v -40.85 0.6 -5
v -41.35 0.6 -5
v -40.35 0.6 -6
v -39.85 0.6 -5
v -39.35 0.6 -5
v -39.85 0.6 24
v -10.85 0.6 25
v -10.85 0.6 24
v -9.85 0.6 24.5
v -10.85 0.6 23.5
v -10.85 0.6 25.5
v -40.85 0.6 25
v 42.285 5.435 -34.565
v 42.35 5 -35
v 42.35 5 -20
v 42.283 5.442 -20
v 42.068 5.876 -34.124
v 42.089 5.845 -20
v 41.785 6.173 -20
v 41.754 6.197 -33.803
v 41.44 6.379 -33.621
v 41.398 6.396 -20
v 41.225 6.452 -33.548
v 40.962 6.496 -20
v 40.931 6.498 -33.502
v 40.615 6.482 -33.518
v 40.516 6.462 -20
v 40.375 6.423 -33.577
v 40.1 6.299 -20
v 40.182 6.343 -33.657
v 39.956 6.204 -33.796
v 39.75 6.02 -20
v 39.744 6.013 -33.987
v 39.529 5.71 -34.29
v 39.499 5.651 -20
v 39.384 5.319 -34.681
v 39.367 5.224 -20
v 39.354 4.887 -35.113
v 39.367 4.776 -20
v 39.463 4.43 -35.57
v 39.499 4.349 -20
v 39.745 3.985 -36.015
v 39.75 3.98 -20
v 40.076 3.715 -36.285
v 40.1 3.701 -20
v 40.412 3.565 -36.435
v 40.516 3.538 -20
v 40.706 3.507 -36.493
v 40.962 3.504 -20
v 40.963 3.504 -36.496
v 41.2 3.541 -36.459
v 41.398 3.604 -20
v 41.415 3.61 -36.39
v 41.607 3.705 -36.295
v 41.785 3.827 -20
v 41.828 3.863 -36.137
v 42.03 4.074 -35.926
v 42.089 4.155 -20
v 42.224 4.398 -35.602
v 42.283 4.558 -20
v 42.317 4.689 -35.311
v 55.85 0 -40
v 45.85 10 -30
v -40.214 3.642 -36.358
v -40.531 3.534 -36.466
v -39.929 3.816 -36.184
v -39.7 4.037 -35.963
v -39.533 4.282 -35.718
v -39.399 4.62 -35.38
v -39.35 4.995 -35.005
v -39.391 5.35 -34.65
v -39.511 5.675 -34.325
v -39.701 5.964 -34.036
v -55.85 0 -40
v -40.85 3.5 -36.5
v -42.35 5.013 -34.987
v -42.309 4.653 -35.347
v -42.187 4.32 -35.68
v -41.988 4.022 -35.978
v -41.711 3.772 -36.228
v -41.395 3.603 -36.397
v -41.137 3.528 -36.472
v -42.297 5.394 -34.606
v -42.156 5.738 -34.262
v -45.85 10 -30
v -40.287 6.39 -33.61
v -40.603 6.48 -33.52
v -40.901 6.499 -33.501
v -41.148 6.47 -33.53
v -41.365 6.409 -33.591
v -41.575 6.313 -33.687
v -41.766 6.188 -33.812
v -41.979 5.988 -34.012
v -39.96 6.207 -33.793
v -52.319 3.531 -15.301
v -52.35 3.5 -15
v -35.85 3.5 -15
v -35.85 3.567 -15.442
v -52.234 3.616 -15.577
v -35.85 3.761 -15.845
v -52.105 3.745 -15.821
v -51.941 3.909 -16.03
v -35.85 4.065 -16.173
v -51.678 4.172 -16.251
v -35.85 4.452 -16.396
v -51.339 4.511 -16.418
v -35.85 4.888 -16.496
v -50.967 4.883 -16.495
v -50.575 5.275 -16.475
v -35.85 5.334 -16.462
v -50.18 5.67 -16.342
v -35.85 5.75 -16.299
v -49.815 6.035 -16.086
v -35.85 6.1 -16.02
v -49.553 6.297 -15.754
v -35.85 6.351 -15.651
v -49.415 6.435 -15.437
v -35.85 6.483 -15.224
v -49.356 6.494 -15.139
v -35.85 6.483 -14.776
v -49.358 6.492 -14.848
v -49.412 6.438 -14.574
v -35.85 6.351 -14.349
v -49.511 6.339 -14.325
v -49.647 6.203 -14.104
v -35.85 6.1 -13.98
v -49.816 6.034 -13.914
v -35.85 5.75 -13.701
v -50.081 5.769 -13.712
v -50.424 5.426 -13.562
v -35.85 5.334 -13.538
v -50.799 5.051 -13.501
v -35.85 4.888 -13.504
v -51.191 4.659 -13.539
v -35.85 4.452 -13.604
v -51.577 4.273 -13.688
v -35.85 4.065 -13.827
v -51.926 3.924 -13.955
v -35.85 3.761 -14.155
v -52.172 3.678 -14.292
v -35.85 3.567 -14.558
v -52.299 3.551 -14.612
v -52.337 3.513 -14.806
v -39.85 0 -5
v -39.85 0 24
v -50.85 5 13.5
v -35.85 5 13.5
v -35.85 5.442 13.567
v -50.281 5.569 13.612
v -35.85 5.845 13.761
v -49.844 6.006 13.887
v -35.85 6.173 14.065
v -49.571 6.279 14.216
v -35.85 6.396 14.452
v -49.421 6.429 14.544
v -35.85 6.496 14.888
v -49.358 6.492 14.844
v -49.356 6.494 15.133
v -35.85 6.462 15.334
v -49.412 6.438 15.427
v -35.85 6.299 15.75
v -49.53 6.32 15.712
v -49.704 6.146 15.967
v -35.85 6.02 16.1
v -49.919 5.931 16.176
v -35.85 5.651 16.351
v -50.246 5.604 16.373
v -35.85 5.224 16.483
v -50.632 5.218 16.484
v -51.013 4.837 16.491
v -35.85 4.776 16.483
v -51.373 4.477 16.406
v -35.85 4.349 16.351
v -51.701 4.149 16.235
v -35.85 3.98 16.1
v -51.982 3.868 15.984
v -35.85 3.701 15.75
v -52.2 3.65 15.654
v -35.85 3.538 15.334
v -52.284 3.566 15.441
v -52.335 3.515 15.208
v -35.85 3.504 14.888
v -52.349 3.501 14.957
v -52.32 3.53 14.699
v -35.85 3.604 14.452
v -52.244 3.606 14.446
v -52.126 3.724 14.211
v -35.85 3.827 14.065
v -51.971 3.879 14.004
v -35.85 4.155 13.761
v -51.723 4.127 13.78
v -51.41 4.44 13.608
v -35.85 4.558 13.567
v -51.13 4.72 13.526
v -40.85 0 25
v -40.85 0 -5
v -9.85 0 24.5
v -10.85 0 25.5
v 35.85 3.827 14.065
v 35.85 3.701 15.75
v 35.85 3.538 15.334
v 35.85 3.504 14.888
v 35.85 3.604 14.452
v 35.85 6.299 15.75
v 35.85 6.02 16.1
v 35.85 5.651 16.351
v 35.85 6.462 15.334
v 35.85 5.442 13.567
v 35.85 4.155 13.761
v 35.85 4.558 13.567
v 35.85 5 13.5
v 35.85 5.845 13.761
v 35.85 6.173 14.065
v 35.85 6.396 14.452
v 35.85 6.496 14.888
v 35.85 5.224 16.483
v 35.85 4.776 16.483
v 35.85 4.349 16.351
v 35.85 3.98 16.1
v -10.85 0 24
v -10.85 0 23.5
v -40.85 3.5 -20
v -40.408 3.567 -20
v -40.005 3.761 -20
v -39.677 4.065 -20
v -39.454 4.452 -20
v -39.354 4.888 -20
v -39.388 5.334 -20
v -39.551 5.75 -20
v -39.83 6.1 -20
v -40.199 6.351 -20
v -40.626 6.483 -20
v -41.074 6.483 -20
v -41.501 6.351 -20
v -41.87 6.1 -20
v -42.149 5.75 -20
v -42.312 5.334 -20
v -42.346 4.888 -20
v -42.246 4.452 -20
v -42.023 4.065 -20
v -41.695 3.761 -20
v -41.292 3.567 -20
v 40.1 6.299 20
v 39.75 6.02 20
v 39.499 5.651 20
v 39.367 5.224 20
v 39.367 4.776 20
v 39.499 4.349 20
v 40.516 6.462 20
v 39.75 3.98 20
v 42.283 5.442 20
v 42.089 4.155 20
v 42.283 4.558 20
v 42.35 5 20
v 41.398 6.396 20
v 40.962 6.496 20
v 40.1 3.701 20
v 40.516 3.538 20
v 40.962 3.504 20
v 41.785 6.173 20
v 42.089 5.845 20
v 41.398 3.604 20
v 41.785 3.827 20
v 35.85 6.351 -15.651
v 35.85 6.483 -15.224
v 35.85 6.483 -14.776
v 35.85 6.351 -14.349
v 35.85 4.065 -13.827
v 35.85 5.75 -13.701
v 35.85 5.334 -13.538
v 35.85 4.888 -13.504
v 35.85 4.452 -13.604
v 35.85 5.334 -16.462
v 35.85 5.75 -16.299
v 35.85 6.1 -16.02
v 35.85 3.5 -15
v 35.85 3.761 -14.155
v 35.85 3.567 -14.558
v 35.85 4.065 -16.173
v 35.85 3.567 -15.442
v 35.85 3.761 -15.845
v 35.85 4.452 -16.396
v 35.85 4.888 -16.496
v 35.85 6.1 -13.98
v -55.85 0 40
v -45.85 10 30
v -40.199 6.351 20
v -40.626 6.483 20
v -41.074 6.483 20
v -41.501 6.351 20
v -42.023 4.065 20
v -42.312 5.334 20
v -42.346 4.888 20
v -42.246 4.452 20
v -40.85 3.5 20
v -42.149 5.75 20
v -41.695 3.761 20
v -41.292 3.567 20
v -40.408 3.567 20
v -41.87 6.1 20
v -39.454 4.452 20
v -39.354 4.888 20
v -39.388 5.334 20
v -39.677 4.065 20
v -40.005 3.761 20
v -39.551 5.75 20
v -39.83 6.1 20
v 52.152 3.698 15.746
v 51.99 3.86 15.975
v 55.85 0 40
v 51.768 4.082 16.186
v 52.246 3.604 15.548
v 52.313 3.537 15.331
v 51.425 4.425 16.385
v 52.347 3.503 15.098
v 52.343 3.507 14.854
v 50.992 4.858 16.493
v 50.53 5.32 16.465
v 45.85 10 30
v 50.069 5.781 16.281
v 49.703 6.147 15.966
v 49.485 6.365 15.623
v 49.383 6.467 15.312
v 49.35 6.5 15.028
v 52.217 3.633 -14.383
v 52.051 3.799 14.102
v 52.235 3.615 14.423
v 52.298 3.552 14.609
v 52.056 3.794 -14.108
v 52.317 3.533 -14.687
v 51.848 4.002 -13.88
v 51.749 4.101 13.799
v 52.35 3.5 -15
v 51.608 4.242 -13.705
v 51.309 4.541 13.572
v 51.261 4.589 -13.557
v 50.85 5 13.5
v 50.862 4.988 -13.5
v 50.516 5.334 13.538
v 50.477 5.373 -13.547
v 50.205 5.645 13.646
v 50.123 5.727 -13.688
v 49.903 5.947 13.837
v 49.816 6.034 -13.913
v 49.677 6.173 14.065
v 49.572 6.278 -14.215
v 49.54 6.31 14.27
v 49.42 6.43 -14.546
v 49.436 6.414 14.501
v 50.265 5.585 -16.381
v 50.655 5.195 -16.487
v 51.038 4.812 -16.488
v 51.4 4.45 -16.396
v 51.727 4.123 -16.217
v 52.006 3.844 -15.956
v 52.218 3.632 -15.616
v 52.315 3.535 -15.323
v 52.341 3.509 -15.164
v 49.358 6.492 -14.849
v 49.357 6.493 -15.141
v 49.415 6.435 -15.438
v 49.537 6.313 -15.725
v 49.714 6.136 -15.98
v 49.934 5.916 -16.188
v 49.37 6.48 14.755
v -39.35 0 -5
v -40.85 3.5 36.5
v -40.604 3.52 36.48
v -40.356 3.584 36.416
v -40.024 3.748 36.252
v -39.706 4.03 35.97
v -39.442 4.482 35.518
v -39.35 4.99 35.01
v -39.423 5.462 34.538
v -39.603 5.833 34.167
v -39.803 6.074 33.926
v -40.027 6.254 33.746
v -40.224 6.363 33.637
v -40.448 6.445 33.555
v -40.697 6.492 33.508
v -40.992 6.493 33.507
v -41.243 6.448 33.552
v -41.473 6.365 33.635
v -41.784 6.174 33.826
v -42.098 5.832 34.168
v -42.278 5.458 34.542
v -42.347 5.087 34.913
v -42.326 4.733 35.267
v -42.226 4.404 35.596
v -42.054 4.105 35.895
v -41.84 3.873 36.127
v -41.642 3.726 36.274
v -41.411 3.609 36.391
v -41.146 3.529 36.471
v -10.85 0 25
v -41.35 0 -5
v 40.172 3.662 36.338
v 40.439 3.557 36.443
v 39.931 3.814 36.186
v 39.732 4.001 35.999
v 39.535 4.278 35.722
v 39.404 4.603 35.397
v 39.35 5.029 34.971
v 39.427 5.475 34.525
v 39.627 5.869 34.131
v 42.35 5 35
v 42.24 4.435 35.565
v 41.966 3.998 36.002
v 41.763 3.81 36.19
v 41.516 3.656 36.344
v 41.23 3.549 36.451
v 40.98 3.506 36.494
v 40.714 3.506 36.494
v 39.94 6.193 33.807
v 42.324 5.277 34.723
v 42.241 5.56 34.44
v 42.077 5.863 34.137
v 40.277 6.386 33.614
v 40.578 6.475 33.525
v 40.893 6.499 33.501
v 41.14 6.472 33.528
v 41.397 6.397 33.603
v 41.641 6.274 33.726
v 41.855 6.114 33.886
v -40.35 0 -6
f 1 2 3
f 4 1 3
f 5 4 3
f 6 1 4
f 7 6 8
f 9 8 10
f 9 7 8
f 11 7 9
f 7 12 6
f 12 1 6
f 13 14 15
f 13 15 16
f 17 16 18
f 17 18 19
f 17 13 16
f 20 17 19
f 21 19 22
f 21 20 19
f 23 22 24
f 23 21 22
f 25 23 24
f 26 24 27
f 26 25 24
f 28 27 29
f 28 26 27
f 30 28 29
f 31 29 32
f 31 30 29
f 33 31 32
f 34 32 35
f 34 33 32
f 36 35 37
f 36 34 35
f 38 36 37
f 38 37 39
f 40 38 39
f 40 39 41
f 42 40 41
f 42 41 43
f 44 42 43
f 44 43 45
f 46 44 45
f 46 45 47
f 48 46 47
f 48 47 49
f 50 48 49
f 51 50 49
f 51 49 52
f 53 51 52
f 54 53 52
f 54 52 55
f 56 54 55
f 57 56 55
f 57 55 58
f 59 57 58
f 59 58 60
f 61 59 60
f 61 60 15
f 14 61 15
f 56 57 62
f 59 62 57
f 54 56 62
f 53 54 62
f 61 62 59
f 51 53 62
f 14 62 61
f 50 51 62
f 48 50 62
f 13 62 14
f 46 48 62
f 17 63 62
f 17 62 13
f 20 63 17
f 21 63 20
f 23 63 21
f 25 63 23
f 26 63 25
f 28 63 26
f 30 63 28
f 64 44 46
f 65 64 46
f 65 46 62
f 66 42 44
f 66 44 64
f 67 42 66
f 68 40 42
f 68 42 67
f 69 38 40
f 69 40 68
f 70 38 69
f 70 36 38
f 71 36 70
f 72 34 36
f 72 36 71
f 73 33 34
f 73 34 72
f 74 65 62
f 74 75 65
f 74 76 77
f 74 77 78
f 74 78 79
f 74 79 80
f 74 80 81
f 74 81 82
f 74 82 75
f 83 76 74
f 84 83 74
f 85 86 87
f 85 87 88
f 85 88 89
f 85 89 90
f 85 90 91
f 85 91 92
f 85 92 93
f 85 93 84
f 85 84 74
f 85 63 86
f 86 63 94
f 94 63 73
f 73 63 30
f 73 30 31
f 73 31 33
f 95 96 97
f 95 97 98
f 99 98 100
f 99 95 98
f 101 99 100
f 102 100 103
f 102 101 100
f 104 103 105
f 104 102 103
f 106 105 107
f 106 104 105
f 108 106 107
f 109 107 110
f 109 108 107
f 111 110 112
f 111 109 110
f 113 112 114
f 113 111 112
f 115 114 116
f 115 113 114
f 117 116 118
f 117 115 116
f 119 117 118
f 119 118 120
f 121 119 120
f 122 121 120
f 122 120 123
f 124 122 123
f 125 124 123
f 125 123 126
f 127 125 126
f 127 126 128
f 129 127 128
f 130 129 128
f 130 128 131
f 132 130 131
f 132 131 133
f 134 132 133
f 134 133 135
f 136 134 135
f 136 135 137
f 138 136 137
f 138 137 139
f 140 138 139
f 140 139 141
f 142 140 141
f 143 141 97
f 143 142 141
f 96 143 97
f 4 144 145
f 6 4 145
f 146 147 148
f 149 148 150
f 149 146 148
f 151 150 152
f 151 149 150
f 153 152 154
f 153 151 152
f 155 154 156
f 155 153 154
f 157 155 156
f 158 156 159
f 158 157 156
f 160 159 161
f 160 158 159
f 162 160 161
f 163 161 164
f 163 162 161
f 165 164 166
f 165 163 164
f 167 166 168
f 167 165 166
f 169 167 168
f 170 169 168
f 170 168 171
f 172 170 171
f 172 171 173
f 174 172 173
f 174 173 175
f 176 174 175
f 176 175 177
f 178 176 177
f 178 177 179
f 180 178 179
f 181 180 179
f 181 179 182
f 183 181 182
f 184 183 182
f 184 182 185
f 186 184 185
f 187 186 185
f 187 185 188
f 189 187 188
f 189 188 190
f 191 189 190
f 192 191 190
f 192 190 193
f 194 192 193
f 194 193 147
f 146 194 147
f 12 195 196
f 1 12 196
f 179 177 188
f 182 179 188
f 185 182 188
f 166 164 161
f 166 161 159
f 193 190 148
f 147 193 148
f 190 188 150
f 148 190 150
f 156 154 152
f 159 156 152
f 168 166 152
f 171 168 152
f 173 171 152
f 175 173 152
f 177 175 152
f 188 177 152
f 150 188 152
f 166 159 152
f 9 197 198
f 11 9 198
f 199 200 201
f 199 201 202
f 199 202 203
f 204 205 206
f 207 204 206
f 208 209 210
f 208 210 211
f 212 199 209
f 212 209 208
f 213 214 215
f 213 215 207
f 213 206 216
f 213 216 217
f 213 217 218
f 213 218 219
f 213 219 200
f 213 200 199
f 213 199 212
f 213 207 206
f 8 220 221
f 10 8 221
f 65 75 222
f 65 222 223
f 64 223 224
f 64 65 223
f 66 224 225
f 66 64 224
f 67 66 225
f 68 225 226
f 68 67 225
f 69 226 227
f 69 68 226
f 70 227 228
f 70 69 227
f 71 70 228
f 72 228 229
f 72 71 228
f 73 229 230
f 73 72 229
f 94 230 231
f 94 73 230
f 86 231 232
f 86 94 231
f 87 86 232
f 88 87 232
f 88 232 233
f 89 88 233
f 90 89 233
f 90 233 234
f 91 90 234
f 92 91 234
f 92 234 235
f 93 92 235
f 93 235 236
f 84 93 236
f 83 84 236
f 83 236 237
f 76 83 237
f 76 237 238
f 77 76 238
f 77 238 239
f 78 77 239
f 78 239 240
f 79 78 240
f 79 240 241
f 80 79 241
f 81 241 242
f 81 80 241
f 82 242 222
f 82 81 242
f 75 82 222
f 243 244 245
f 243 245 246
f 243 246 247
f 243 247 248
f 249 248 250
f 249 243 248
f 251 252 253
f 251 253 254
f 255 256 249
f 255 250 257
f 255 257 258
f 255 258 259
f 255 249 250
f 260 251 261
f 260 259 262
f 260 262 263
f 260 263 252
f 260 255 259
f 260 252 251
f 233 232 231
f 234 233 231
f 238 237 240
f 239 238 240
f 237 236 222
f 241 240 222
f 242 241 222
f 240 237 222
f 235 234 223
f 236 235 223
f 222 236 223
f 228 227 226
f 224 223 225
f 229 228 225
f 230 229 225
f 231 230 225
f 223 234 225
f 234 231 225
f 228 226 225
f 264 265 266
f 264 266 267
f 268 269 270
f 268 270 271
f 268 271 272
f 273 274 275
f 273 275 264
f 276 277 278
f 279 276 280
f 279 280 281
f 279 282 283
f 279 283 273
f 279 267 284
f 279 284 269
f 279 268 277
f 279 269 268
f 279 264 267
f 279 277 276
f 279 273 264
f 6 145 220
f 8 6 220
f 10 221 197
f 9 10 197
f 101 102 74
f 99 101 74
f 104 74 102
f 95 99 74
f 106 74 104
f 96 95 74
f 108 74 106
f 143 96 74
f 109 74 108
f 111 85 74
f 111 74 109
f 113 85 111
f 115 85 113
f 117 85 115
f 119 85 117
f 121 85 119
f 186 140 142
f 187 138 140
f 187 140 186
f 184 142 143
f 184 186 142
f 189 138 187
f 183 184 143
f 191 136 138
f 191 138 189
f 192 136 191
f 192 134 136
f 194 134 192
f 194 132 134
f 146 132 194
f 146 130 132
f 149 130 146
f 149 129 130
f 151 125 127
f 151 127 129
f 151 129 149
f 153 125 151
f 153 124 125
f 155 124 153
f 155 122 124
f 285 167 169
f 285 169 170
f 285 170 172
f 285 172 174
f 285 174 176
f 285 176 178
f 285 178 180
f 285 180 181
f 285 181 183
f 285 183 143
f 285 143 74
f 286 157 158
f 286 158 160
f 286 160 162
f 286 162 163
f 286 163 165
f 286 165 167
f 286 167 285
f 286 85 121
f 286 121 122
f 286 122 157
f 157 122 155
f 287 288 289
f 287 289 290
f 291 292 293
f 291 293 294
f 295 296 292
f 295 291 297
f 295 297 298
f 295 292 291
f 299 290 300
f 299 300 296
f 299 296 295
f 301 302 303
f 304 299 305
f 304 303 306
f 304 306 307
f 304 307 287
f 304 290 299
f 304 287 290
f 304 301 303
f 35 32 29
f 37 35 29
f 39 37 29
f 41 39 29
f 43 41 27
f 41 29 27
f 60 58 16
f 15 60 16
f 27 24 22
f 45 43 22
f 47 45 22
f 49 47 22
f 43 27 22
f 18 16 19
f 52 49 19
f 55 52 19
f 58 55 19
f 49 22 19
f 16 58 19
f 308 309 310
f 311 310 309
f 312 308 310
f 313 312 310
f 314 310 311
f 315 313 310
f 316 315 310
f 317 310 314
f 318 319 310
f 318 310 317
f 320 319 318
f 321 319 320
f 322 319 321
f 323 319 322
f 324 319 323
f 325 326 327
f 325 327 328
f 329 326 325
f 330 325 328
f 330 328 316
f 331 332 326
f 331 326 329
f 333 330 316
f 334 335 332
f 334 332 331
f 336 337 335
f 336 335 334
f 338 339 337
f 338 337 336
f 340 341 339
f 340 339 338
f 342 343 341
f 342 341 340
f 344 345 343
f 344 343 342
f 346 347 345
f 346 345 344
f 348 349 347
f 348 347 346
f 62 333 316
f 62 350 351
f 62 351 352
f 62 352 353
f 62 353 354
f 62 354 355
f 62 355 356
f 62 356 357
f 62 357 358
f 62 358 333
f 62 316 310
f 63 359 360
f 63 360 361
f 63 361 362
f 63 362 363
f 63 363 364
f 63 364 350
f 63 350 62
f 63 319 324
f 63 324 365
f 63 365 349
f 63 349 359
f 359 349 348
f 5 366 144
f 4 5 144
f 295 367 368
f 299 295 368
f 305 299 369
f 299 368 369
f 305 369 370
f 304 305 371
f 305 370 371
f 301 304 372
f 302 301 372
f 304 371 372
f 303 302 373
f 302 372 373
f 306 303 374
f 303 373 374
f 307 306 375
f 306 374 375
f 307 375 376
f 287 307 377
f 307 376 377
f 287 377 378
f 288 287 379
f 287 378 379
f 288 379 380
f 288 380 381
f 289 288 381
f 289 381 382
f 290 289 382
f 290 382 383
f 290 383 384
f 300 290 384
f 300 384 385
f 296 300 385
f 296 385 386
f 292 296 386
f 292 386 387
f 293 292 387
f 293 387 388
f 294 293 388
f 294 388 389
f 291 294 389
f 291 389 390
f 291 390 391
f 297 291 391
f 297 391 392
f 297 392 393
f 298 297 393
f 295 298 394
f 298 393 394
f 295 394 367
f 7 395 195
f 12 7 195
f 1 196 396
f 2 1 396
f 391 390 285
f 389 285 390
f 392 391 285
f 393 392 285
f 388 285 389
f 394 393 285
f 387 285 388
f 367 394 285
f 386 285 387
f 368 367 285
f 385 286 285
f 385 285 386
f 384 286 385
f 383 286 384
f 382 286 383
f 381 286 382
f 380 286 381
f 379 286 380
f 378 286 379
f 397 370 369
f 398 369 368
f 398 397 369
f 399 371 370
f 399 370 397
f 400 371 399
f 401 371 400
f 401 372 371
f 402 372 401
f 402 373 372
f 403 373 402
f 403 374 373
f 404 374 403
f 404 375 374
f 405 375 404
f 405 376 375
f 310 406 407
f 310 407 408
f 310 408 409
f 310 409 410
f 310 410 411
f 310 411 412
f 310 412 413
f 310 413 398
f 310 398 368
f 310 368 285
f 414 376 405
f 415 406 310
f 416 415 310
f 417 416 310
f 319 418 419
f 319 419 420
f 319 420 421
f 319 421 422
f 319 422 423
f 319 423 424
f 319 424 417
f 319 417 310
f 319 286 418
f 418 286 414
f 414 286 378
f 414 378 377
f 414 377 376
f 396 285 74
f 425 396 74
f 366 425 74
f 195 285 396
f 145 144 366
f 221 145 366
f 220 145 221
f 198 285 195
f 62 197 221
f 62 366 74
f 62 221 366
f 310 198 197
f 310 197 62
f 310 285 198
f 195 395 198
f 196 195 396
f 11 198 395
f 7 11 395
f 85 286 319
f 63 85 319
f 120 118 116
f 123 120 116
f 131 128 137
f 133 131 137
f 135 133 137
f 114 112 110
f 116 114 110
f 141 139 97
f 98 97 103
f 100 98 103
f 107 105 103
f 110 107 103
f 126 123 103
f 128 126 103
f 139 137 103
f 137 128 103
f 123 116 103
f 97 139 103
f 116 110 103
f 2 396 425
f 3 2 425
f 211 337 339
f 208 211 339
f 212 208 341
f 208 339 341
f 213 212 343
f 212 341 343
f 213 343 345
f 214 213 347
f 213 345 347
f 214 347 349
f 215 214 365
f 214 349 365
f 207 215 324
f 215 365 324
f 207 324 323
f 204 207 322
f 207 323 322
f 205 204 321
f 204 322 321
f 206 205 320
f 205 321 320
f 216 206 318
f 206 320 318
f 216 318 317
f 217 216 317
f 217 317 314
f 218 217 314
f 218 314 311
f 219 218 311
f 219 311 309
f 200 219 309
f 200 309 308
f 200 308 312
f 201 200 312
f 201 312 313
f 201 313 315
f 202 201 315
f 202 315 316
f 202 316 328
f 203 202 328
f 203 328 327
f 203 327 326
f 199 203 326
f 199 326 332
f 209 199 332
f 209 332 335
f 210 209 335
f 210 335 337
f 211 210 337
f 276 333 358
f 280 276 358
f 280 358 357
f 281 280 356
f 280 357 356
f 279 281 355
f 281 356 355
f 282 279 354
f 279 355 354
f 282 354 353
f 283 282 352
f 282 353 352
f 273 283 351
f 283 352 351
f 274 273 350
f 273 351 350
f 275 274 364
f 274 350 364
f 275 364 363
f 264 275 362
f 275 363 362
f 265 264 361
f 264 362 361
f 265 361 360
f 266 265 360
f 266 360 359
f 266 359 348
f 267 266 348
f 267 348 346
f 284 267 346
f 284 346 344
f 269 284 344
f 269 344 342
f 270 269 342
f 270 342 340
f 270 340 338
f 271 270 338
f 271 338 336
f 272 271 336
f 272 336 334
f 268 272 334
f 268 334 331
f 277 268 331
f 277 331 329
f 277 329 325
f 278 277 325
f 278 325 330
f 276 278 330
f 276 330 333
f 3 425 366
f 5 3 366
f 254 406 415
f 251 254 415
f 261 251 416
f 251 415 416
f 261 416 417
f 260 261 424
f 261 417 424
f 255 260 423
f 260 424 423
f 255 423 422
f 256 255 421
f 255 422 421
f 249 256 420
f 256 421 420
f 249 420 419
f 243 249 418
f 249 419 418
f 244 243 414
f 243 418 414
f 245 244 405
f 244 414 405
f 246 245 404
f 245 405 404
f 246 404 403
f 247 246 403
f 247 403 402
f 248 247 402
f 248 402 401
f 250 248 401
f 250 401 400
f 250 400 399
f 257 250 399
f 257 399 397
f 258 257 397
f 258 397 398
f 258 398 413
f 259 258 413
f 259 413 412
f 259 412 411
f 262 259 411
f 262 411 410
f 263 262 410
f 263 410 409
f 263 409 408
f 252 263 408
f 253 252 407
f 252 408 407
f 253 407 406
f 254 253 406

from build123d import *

# Parameters (mm, degrees)
SKETCH_3_R          = 1.5
CUT_EXTRUDE_1_DEPTH = 20
SKETCH_4_R          = 1.5
CUT_EXTRUDE_2_DEPTH = 20
CUT_EXTRUDE_3_DEPTH = 0.6


with BuildPart() as part:
    # Эскиз1 → По сечениям1 section 0
    with BuildSketch(Plane(origin=(0, 0, 0), x_dir=(1, 0, 0), z_dir=(0, 1, 0))):
        with BuildLine():
            Line((-55.85, -40), (55.85, -40))
            Line((55.85, -40), (55.85, 40))
            Line((55.85, 40), (-55.85, 40))
            Line((-55.85, 40), (-55.85, -40))
        make_face()
    # Эскиз2 → По сечениям1 section 1
    with BuildSketch(Plane(origin=(0, 10, 0), x_dir=(1, 0, 0), z_dir=(0, 1, 0))):
        with BuildLine():
            Line((45.85, 30), (-45.85, 30))
            Line((-45.85, 30), (-45.85, -30))
            Line((-45.85, -30), (45.85, -30))
            Line((45.85, -30), (45.85, 30))
        make_face()
    loft()

    # Эскиз3 → Вырез-Вытянуть1 (cut)
    with BuildSketch(Plane.XY.offset(40)):
        with Locations((40.85, 5)):
            Circle(SKETCH_3_R)
        with Locations(Location((-40.85, 5, 0), (0, 0, 270))):
            Circle(SKETCH_3_R)
    cut_extrude_1 = extrude(amount=-CUT_EXTRUDE_1_DEPTH, mode=Mode.SUBTRACT)

    # Зеркальное отражение1: Вырез-Вытянуть1 across plane
    add(cut_extrude_1.mirror(Plane.XY), mode=Mode.SUBTRACT)

    # Эскиз4 → Вырез-Вытянуть2 (cut)
    with BuildSketch(Plane(origin=(55.85, 0, 0), x_dir=(0, 0, -1), z_dir=(1, 0, 0))):
        with Locations((-15, 5)):
            Circle(SKETCH_4_R)
        with Locations(Location((15, 5, 0), (0, 0, 270))):
            Circle(SKETCH_4_R)
    cut_extrude_2 = extrude(amount=-CUT_EXTRUDE_2_DEPTH, mode=Mode.SUBTRACT)

    # Зеркальное отражение2: Вырез-Вытянуть2 across plane
    add(cut_extrude_2.mirror(Plane(origin=(0, 0, 0), x_dir=(0, 0, 1), z_dir=(1, 0, 0))), mode=Mode.SUBTRACT)

    # Эскиз5 → Вырез-Вытянуть3 (cut)
    with BuildSketch(Plane.XZ):
        Polygon((-10.85, 25), (-40.85, 25), (-40.85, -5), (-41.35, -5), (-40.35, -6), (-39.35, -5), (-39.85, -5), (-39.85, 24), (-10.85, 24), (-10.85, 23.5), (-9.85, 24.5), (-10.85, 25.5), align=None)
    extrude(amount=-CUT_EXTRUDE_3_DEPTH, mode=Mode.SUBTRACT)


solid = part.part
